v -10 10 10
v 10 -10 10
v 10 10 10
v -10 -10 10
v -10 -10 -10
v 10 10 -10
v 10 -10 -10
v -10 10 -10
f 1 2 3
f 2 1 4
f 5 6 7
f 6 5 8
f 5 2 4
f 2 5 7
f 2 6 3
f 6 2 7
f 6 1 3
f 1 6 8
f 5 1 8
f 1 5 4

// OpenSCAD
//
// Example 01: Hello Cube - Your First 3D Object
// A simple cube with some basic transformations.
//

cube_size = 20;

// A simple cube centered at origin
cube(cube_size, center = true);
